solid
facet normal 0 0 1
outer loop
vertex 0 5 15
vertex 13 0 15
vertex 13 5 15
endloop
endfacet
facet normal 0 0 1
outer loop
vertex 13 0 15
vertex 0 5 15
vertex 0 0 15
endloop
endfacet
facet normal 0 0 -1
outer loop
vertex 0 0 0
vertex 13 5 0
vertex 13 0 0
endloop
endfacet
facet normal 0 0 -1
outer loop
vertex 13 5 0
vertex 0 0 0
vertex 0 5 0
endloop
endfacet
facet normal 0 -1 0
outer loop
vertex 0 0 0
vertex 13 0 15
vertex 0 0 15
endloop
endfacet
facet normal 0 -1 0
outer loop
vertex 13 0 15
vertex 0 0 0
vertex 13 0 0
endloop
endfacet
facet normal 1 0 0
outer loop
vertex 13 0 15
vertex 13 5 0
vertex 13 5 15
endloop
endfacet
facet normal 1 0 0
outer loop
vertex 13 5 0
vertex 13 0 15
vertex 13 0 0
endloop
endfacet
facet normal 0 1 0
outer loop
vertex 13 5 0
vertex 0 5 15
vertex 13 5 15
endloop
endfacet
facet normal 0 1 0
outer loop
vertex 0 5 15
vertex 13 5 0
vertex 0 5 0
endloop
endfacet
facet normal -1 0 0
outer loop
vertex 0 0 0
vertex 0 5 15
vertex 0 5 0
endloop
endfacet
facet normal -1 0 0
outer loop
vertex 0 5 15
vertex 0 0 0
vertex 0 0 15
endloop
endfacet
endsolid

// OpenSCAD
// Generated by SolidPython 1.0.1 on 2020-07-29 00:46:55


cube(size = [13, 5, 15]);
/***********************************************
*********      SolidPython code:      **********
************************************************
 
# import packages: SolidPython
from solid import *
from solid.utils import *
from itertools import chain, combinations, permutations


class Resize:

    def __init__(self, scad_file):
        self.scad_file = scad_file
        #self.scad_file = import_scad(scad_file)
        # cone/cylinder param:
        self.r1 = 0
        self.r2 = 0
        self.h = 0
        # rectangular prism param:
        self.w = 0
        self.l = 0
        # ellipse param:
        self.r = 0

    # import OpenScad code (file name corresponds to shape)


    # classify shape + parameters
    def assign(self, param1, param2, param3):
        if self.scad_file == 'cone.scad':
            self.r1 = param1
            self.r2 = param2
            self.h = param3
        elif self.scad_file == 'cylinder.scad':
            self.r1 = param1
            self.r2 = param2
            self.h = param3
        elif self.scad_file == 'rectangularPrism.scad':
            self.h = param1
            self.l = param2
            self.w = param3
        else:
            self.r = param1
            self.h = param2

    # resize parameters
    def iterate(self):
        x = range(3, 20, 2)
        i = 1
        if self.scad_file == 'cone.scad':
            tempList = list(permutations(x, 2))
            for temp in tempList:
                param1 = temp[0]
                param2 = temp[1]
                filepath = 'produced_scad_files/' + 'cone' + str(param1) + '_' + str(param2) + '_' + '.scad'
                scad_render_to_file(cylinder(h=param1, r1=param2, r2=0), filepath)

        elif self.scad_file == 'cylinder.scad':
            tempList = list(permutations(x, 3))
            for temp in tempList:
                param1 = temp[0]
                param2 = temp[1]
                filepath = 'produced_scad_files/' + 'cylinder' + str(param1) + '_' + str(param2) + '_' + '.scad'
                scad_render_to_file(cylinder(h=param1, r1=param2, r2=param2), filepath)

        elif self.scad_file == 'rectangularPrism.scad':
            tempList = list(permutations(x, 3))
            for temp in tempList:
                param1 = temp[0]
                param2 = temp[1]
                param3 = temp[2]
                filepath = 'produced_scad_files/' + 'rectangularPrism' + str(param1) + '_' + str(param2) + '_' + str(
                    param3) + '.scad'
                scad_render_to_file(cube(size=(param1, param2, param3)), filepath)

        elif self.scad_file == 'ellipse.scad':
            tempList = list(permutations(x, 4))
            for temp in tempList:
                param1 = temp[0]
                param2 = temp[1]
                param3 = temp[2]
                param4 = temp[3]
                filepath = 'produced_scad_files/' + 'ellipse' + str(param1) + '_' + str(param2) + '_' + str(param3) + '_' + str(param4) + '.scad'
                scad_render_to_file(scale([param1, param2, param3])(sphere(r=param4)), filepath)

    def render_to_scadfile(self):
        scad_render_to_file(scad, 'example.scad') 
 
************************************************/
